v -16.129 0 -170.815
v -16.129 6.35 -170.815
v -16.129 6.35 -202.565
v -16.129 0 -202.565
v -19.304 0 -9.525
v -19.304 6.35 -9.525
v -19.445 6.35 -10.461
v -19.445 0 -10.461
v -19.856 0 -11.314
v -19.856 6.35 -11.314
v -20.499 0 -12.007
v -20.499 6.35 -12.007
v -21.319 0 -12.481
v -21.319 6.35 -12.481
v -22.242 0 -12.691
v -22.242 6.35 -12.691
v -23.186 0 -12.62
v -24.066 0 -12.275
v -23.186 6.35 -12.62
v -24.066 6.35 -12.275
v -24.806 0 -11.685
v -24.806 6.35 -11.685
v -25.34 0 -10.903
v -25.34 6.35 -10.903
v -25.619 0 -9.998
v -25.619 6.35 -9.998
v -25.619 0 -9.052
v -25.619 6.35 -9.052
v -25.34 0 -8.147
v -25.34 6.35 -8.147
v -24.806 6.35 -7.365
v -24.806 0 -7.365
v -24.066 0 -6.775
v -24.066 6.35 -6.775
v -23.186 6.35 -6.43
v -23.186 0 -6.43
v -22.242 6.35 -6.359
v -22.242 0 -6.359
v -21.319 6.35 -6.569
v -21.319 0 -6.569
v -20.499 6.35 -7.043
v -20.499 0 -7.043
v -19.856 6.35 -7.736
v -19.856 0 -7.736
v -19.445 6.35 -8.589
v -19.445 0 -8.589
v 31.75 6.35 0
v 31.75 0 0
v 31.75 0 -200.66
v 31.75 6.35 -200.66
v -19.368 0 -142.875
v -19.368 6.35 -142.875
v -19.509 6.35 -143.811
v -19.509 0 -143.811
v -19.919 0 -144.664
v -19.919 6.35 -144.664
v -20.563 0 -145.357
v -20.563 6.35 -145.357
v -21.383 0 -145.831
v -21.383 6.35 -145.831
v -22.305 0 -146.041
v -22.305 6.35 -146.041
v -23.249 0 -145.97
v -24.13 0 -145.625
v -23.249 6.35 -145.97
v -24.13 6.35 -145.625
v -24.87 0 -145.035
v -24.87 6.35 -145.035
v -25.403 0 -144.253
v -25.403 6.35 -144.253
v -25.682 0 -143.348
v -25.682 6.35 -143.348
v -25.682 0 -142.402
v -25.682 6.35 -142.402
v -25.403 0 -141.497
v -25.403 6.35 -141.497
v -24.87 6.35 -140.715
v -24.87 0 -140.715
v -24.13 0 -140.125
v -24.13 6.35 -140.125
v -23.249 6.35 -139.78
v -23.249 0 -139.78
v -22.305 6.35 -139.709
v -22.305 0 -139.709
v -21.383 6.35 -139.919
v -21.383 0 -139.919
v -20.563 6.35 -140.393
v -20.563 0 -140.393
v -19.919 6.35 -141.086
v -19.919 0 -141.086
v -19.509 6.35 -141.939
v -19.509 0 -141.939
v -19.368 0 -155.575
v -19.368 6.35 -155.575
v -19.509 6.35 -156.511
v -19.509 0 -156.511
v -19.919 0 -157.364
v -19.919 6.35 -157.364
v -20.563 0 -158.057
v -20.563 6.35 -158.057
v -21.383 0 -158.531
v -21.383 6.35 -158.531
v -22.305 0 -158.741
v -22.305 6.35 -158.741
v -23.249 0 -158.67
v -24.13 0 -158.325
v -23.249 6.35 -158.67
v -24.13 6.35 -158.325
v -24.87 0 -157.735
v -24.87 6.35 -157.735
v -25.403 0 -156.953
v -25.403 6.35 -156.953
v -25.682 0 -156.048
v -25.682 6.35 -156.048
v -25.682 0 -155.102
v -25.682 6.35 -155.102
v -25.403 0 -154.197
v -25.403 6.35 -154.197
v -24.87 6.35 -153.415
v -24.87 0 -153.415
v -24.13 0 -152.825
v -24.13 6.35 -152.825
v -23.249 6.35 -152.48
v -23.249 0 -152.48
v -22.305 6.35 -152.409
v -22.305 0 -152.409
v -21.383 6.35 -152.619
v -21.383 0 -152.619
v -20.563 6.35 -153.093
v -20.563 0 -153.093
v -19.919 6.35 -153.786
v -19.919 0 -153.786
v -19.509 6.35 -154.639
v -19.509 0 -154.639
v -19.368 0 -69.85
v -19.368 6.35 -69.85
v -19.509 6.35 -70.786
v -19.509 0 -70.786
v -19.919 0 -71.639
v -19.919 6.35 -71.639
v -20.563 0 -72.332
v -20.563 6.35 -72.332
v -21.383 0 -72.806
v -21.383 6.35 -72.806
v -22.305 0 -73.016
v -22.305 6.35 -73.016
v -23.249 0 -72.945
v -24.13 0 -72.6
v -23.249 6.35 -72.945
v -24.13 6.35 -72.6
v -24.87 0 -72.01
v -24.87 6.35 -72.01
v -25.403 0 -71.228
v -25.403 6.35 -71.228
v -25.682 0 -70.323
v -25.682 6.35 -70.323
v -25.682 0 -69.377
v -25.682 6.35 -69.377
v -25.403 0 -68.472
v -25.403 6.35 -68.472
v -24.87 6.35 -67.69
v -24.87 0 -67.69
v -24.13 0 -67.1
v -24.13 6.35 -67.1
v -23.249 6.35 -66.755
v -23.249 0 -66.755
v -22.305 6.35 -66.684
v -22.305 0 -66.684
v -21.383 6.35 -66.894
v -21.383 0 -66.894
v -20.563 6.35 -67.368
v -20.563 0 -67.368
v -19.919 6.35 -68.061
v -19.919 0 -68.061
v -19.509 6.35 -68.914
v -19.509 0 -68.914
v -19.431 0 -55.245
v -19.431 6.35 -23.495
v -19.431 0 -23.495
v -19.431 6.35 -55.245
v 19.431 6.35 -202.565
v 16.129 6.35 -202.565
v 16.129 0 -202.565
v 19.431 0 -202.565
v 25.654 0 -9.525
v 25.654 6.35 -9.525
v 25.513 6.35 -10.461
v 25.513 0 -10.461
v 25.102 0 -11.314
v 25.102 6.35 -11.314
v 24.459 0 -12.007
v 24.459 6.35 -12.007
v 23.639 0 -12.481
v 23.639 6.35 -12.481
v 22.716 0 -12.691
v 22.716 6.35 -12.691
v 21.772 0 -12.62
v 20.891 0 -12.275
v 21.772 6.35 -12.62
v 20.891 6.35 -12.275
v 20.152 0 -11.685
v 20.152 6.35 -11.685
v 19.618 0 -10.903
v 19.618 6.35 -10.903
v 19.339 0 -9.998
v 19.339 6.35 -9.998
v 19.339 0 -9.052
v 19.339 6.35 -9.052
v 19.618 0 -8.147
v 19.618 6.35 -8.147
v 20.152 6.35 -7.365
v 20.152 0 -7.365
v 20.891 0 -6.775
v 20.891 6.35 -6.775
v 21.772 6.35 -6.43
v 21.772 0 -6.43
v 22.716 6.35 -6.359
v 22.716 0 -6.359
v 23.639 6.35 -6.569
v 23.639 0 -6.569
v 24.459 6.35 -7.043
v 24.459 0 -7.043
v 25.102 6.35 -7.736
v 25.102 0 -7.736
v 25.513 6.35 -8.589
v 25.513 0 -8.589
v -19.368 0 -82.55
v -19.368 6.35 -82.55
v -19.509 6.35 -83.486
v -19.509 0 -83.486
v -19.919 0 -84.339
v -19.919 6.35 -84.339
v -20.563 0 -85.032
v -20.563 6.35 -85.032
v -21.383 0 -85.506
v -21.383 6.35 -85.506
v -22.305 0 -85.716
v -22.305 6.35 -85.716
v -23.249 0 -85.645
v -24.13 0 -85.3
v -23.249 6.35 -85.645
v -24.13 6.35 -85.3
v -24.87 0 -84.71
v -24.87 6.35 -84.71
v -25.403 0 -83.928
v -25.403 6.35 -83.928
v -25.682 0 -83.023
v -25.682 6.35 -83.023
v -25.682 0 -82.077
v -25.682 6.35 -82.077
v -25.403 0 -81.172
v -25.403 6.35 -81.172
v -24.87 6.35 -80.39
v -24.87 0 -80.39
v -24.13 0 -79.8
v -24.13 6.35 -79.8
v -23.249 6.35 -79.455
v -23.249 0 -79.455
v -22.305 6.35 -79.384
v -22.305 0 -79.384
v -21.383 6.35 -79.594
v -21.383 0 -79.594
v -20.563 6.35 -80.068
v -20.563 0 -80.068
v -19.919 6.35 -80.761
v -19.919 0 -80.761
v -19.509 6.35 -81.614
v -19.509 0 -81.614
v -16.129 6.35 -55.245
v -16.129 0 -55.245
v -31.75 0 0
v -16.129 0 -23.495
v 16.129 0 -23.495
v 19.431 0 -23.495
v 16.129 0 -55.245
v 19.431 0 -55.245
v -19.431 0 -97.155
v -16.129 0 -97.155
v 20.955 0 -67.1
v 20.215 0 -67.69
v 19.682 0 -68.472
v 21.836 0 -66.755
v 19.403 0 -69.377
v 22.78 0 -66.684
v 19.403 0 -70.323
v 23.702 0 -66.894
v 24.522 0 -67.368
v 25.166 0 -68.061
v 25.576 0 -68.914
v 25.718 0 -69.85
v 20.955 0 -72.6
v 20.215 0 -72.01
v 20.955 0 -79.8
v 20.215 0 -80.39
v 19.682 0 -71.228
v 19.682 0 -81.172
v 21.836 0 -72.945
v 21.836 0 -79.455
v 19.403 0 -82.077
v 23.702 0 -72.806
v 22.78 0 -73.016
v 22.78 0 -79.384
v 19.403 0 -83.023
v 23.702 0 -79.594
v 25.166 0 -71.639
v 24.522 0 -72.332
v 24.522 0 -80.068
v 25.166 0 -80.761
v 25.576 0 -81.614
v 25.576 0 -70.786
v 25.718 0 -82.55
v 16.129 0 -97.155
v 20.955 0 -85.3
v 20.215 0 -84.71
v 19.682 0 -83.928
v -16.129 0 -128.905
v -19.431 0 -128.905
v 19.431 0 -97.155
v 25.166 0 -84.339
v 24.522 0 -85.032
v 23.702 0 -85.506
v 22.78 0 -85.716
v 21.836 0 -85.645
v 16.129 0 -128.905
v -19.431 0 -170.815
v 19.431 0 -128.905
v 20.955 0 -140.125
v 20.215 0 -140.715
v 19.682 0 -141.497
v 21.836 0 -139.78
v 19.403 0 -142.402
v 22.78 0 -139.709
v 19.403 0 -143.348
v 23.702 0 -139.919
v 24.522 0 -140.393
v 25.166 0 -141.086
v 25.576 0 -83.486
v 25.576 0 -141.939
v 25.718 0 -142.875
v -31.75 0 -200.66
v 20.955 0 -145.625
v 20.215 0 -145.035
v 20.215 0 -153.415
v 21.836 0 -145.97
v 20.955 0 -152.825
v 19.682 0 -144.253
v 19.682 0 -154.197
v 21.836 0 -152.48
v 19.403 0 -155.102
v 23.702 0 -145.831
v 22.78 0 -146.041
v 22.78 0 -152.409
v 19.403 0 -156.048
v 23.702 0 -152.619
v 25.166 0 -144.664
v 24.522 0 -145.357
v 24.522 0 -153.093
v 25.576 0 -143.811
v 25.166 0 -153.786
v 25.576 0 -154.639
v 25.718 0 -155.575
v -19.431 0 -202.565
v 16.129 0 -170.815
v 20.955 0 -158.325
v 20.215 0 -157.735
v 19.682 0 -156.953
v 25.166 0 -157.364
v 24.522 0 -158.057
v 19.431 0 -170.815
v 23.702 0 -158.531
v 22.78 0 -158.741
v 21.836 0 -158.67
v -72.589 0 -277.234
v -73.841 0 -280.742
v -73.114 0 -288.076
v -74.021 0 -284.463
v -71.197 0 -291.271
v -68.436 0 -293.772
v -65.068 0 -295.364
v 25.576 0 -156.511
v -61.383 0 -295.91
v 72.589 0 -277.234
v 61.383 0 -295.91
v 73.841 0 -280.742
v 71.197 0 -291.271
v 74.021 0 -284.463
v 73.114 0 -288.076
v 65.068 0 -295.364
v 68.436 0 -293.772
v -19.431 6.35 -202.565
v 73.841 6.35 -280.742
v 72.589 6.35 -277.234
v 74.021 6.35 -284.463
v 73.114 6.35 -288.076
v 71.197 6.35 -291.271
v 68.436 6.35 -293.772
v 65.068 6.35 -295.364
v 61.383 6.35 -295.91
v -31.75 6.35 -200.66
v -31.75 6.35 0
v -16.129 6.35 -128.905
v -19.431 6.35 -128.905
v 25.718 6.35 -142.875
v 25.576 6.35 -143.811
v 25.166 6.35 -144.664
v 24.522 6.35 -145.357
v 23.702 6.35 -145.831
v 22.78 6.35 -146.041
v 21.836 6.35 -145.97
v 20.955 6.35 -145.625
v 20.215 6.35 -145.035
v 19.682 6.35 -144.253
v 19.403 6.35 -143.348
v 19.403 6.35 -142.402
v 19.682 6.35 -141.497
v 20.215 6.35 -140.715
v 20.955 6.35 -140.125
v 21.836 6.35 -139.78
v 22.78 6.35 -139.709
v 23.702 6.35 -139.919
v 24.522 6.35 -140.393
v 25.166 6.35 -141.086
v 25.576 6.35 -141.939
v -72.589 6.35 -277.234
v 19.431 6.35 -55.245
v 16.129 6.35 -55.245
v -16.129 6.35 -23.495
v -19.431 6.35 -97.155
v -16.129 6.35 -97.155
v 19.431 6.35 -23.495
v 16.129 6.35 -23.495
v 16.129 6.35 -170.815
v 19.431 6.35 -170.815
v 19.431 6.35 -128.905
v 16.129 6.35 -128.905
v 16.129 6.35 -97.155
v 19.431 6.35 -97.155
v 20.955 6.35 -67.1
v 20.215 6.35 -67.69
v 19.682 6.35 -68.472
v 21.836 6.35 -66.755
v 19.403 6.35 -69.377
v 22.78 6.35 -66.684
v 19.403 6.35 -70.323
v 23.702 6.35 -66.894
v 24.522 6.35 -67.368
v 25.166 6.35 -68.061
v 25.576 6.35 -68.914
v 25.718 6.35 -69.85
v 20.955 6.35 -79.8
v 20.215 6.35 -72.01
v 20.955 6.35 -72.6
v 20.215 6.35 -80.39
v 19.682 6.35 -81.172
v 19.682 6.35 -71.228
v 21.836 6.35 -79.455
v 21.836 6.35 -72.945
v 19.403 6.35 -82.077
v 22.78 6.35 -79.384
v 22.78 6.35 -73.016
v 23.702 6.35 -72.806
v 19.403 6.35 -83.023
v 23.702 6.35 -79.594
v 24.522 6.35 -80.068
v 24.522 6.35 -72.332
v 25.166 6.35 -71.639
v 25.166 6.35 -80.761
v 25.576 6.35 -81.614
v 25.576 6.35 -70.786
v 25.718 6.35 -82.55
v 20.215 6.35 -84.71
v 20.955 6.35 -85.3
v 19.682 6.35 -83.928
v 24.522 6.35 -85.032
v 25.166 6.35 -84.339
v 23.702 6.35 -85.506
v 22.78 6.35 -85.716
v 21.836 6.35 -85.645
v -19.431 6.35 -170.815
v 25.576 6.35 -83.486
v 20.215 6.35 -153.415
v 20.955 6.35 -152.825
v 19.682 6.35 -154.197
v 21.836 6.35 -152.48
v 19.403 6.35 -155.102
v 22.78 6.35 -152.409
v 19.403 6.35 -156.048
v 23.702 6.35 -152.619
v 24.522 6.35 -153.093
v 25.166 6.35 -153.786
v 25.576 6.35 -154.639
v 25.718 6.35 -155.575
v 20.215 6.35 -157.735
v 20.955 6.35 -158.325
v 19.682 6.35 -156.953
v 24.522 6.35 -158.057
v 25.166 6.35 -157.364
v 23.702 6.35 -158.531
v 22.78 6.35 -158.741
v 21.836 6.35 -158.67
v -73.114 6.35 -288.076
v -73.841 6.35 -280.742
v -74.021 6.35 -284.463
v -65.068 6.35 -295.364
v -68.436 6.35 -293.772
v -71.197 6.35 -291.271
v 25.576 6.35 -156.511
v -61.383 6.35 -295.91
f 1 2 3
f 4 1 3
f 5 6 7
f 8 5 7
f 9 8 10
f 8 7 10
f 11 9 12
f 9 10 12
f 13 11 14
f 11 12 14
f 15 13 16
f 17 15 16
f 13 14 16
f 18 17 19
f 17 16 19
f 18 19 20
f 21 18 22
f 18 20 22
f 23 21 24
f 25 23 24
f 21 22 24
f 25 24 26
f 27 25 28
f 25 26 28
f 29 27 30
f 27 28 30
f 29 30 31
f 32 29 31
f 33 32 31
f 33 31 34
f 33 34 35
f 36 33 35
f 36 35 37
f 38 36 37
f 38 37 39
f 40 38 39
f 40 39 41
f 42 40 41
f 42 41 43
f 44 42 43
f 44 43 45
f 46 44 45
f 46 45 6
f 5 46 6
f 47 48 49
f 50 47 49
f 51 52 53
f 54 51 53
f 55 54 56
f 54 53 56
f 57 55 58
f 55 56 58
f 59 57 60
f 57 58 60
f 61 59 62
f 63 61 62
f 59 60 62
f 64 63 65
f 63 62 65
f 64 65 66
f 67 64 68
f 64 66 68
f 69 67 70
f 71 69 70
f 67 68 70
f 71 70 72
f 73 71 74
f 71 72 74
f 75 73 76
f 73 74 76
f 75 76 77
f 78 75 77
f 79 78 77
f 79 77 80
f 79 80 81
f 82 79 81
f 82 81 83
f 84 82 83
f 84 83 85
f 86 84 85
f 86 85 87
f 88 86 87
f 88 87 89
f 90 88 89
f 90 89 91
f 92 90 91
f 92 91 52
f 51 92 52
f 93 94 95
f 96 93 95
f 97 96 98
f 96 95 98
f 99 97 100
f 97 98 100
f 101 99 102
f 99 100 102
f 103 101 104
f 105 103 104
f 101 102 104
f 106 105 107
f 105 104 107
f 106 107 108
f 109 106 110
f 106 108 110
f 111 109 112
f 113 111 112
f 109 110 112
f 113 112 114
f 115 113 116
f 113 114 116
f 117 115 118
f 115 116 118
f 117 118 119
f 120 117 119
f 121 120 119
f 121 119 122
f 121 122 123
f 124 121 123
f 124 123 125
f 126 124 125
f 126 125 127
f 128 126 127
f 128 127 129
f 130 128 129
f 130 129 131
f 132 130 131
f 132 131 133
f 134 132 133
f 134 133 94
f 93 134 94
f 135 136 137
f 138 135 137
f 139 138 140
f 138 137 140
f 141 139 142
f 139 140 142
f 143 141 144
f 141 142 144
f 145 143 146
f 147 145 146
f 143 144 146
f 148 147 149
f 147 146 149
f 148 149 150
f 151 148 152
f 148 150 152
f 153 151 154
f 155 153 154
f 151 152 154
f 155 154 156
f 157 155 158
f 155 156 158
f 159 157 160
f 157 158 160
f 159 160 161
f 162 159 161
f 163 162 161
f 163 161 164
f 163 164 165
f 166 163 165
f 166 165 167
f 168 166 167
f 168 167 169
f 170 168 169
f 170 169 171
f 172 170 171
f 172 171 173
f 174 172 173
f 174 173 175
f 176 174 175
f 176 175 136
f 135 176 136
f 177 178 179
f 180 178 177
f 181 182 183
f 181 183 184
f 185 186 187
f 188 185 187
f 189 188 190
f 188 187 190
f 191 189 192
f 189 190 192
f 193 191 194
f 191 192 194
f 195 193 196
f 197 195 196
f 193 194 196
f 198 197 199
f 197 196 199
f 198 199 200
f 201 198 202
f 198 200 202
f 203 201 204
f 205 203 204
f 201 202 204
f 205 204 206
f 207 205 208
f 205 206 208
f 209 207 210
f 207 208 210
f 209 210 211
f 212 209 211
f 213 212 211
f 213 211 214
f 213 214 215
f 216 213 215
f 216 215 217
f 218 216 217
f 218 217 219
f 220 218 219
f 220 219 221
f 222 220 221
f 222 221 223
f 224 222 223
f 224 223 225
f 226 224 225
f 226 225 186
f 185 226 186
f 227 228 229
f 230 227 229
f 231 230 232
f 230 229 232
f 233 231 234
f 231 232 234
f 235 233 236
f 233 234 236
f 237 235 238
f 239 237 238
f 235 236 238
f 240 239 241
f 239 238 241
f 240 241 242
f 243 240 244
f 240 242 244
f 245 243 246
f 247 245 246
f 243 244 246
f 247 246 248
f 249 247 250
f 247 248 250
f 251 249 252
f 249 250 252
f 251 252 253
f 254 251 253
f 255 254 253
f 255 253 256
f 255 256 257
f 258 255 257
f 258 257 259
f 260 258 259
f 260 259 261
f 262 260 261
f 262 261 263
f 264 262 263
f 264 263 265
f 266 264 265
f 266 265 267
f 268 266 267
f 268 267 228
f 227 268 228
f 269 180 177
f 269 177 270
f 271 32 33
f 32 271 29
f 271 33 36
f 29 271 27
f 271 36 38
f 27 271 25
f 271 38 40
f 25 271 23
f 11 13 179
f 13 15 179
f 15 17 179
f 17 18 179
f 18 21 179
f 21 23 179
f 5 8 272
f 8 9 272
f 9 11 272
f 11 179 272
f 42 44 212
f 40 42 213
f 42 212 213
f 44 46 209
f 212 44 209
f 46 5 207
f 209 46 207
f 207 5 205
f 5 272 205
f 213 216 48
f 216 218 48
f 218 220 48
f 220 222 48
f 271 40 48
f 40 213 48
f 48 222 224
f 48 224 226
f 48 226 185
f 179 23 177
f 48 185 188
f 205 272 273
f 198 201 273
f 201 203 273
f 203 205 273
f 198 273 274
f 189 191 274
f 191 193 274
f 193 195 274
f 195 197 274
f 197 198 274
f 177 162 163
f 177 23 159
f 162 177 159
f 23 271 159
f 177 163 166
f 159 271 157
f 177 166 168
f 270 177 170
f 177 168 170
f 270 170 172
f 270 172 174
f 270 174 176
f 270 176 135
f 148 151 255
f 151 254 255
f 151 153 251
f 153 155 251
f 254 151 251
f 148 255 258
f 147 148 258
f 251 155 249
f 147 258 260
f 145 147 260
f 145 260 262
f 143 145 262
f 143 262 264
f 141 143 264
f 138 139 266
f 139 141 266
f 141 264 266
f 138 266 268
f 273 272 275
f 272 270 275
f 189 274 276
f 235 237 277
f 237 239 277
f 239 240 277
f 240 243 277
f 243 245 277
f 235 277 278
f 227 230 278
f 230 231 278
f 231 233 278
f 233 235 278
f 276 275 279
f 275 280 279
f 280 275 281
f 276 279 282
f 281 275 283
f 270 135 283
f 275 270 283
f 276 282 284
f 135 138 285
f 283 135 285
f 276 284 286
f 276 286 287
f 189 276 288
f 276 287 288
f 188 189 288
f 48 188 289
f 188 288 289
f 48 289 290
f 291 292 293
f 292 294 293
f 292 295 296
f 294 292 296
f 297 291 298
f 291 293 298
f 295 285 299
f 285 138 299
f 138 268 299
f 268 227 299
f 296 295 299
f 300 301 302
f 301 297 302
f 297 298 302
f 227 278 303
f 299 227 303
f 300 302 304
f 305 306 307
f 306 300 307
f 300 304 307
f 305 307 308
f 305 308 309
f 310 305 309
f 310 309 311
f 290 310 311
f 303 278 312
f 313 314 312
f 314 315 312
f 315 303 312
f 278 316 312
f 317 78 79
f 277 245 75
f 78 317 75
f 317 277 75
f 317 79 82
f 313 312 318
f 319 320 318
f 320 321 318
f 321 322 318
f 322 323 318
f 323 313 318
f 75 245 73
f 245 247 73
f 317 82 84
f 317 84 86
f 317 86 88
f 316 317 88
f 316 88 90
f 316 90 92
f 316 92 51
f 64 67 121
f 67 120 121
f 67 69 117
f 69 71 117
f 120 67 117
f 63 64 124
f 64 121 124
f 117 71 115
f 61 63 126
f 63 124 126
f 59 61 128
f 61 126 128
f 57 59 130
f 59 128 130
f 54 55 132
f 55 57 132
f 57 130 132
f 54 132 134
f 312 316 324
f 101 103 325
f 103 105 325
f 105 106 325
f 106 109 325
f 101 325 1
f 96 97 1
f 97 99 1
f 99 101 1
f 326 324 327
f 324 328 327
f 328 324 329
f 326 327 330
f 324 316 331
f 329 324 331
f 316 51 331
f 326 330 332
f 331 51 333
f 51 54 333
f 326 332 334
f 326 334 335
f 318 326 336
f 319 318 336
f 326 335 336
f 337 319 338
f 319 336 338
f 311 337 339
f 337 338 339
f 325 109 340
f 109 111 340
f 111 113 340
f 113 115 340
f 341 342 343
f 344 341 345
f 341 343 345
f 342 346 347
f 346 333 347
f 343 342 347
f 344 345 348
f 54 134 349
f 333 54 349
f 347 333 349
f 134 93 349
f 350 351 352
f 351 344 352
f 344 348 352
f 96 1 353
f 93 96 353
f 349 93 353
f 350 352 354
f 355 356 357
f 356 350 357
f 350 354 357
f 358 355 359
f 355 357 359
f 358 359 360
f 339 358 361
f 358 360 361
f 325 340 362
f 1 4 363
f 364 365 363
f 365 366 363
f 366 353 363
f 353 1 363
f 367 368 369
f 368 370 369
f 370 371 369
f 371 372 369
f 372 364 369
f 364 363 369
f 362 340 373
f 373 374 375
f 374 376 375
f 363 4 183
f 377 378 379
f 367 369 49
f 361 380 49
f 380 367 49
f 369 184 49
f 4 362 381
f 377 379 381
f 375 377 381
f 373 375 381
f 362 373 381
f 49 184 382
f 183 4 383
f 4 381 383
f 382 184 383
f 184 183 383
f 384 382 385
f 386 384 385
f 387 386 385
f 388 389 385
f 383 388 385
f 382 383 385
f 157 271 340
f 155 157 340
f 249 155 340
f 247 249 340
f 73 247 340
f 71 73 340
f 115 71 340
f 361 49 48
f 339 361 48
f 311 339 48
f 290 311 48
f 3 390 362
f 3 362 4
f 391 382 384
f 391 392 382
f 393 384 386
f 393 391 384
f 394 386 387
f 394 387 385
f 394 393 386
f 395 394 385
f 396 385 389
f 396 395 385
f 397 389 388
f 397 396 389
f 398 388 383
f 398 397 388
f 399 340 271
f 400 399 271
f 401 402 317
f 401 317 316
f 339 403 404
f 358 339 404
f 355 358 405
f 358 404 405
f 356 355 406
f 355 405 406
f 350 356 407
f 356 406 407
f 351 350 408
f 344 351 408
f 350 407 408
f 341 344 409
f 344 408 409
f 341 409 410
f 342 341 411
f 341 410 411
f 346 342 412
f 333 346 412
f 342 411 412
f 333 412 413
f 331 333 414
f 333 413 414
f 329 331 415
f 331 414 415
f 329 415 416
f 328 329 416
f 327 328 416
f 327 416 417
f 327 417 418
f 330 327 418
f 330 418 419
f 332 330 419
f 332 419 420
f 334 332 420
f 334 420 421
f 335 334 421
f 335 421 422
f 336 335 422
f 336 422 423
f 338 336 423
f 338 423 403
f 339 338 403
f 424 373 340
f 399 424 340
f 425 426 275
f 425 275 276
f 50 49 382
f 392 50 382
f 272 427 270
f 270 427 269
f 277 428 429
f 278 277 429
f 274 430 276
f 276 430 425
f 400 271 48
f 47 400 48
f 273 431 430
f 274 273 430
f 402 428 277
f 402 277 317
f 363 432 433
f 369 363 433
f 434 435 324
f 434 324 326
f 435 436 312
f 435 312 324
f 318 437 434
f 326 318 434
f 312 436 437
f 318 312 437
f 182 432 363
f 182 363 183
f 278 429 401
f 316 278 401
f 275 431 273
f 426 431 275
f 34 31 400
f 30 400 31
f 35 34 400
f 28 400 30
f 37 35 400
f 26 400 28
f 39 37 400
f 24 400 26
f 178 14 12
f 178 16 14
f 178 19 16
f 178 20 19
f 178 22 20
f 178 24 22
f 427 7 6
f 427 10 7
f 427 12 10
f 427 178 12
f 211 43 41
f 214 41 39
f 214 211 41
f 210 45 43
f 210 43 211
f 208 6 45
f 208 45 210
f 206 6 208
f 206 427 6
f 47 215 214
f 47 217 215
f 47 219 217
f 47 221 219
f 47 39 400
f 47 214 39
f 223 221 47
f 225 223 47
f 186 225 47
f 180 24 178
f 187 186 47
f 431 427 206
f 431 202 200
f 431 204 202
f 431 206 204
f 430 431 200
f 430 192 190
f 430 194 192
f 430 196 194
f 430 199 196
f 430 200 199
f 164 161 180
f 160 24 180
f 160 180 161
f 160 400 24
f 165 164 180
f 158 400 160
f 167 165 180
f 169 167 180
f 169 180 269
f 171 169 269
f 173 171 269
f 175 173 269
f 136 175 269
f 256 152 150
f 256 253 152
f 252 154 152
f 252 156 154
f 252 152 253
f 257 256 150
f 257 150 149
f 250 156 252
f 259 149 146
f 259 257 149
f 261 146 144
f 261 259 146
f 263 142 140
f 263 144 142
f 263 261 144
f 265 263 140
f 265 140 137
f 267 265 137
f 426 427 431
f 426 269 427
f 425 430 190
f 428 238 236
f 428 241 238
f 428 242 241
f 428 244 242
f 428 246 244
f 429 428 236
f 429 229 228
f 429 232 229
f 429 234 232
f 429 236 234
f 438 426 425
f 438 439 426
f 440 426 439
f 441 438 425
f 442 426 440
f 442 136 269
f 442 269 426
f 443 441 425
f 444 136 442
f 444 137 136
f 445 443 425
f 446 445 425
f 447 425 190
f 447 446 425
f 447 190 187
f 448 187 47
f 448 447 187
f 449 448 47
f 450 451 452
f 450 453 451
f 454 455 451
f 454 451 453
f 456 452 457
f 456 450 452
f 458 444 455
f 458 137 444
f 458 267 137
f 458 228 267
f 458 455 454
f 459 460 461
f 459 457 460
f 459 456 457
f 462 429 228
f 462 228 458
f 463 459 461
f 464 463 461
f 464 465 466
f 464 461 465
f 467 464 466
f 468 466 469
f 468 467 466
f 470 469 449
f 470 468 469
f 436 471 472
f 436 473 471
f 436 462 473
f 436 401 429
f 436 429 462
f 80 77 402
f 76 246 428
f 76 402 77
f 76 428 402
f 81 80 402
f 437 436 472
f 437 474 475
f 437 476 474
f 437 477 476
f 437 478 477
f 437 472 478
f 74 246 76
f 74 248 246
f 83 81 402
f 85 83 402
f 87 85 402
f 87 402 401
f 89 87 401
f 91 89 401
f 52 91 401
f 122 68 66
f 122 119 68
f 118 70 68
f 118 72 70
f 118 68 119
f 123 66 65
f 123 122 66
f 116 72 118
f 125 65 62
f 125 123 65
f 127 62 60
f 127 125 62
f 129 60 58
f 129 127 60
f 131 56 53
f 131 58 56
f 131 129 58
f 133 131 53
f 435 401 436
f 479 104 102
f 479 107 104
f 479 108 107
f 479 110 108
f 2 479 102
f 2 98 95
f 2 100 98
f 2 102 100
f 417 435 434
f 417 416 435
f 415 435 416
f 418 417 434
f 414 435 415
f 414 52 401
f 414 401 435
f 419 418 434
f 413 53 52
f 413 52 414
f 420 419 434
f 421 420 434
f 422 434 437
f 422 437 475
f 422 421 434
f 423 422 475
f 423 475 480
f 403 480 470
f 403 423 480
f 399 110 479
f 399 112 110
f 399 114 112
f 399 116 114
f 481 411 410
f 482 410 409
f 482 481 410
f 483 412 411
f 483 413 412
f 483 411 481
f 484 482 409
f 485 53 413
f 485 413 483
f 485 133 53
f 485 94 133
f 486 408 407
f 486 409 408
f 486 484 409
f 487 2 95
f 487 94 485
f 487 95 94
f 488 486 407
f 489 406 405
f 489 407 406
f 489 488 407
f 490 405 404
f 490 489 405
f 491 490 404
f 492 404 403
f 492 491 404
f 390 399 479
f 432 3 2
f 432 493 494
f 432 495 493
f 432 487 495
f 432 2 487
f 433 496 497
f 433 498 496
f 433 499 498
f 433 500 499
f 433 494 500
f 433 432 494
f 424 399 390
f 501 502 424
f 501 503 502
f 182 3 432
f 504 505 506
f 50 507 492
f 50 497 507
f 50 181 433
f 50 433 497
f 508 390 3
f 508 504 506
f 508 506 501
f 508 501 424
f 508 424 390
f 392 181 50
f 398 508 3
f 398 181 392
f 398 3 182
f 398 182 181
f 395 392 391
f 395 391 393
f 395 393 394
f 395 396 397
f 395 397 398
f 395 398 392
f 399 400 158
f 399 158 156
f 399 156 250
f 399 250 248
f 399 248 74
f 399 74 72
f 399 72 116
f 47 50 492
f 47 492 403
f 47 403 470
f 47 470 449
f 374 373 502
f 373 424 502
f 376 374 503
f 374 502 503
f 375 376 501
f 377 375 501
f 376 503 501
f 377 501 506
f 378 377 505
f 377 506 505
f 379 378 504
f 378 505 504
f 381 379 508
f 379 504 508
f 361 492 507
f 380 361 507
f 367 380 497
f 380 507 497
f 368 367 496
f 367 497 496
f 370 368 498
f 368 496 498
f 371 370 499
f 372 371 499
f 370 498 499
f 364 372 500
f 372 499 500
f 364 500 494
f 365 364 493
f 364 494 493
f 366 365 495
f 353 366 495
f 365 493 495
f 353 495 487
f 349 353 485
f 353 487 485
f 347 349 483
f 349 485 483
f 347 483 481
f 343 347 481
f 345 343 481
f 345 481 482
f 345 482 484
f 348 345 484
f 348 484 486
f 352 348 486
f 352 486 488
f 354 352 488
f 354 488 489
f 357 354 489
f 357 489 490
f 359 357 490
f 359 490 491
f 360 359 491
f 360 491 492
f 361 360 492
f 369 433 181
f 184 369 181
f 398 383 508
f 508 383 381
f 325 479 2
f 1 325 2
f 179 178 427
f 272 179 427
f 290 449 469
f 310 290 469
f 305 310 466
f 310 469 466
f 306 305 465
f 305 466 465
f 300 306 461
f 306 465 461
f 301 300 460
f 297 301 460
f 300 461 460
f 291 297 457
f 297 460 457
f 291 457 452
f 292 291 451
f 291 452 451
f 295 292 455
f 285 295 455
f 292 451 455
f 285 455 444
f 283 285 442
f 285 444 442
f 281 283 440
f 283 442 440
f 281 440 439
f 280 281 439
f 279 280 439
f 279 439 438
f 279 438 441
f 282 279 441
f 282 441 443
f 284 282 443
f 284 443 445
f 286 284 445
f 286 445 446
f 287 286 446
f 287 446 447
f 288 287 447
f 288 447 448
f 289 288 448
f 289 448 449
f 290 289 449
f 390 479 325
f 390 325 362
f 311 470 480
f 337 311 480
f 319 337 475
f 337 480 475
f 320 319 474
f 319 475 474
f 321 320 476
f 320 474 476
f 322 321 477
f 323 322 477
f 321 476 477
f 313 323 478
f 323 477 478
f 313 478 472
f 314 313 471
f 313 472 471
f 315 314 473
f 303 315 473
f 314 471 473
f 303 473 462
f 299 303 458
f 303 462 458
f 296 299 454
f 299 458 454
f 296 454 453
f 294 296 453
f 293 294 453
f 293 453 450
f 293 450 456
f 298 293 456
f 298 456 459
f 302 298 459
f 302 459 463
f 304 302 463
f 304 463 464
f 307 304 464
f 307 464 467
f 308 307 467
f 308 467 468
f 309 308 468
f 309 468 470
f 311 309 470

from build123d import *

# Parameters (mm, degrees)
BOSS_EXTRUDE1_DEPTH = 6.35
SKETCH2_W           = 3.302
SKETCH2_H           = 31.75
CUT_EXTRUDE1_DEPTH  = 7.35
SKETCH3_R           = 3.175
CUT_EXTRUDE2_DEPTH  = 7.35
FILLET1_R           = 12.7


with BuildPart() as part:
    # Sketch1 → Boss-Extrude1 (new body)
    with BuildSketch(Plane(origin=(0, 0, 0), x_dir=(1, 0, 0), z_dir=(0, 1, 0))):
        Polygon((-31.75, 0), (31.75, 0), (31.75, 200.66), (82.55, 295.91), (-82.55, 295.91), (-31.75, 200.66), align=None)
    extrude(amount=BOSS_EXTRUDE1_DEPTH)

    # Sketch2 → Cut-Extrude1 (cut, through all)
    with BuildSketch(Plane(origin=(0, 6.35, 0), x_dir=(1, 0, 0), z_dir=(0, 1, 0))):
        with Locations((-17.78, 39.37)):
            Rectangle(SKETCH2_W, SKETCH2_H)
        with Locations((-17.78, 113.03)):
            Rectangle(SKETCH2_W, SKETCH2_H)
        with Locations((-17.78, 186.69)):
            Rectangle(SKETCH2_W, SKETCH2_H)
        with Locations((17.78, 39.37)):
            Rectangle(SKETCH2_W, SKETCH2_H)
        with Locations((17.78, 113.03)):
            Rectangle(SKETCH2_W, SKETCH2_H)
        with Locations((17.78, 186.69)):
            Rectangle(SKETCH2_W, SKETCH2_H)
    extrude(amount=-CUT_EXTRUDE1_DEPTH, mode=Mode.SUBTRACT)

    # Sketch3 → Cut-Extrude2 (cut, through all)
    with BuildSketch(Plane(origin=(0, 6.35, 0), x_dir=(1, 0, 0), z_dir=(0, 1, 0))):
        with Locations((-22.5425, 155.575)):
            Circle(SKETCH3_R)
        with Locations((-22.5425, 142.875)):
            Circle(SKETCH3_R)
        with Locations((22.5425, 142.875)):
            Circle(SKETCH3_R)
        with Locations((22.5425, 155.575)):
            Circle(SKETCH3_R)
        with Locations((-22.479, 9.525)):
            Circle(SKETCH3_R)
        with Locations((22.479, 9.525)):
            Circle(SKETCH3_R)
        with Locations((-22.5425, 82.55)):
            Circle(SKETCH3_R)
        with Locations((-22.5425, 69.85)):
            Circle(SKETCH3_R)
        with Locations((22.5425, 69.85)):
            Circle(SKETCH3_R)
        with Locations((22.5425, 82.55)):
            Circle(SKETCH3_R)
    extrude(amount=-CUT_EXTRUDE2_DEPTH, mode=Mode.SUBTRACT)

    # Fillet1
    fillet1_edges = [part.edges().sort_by_distance(p)[0] for p in [
        (-82.55, 3.175, -295.91),
        (82.55, 3.175, -295.91),
    ]]
    fillet(fillet1_edges, radius=FILLET1_R)


solid = part.part
